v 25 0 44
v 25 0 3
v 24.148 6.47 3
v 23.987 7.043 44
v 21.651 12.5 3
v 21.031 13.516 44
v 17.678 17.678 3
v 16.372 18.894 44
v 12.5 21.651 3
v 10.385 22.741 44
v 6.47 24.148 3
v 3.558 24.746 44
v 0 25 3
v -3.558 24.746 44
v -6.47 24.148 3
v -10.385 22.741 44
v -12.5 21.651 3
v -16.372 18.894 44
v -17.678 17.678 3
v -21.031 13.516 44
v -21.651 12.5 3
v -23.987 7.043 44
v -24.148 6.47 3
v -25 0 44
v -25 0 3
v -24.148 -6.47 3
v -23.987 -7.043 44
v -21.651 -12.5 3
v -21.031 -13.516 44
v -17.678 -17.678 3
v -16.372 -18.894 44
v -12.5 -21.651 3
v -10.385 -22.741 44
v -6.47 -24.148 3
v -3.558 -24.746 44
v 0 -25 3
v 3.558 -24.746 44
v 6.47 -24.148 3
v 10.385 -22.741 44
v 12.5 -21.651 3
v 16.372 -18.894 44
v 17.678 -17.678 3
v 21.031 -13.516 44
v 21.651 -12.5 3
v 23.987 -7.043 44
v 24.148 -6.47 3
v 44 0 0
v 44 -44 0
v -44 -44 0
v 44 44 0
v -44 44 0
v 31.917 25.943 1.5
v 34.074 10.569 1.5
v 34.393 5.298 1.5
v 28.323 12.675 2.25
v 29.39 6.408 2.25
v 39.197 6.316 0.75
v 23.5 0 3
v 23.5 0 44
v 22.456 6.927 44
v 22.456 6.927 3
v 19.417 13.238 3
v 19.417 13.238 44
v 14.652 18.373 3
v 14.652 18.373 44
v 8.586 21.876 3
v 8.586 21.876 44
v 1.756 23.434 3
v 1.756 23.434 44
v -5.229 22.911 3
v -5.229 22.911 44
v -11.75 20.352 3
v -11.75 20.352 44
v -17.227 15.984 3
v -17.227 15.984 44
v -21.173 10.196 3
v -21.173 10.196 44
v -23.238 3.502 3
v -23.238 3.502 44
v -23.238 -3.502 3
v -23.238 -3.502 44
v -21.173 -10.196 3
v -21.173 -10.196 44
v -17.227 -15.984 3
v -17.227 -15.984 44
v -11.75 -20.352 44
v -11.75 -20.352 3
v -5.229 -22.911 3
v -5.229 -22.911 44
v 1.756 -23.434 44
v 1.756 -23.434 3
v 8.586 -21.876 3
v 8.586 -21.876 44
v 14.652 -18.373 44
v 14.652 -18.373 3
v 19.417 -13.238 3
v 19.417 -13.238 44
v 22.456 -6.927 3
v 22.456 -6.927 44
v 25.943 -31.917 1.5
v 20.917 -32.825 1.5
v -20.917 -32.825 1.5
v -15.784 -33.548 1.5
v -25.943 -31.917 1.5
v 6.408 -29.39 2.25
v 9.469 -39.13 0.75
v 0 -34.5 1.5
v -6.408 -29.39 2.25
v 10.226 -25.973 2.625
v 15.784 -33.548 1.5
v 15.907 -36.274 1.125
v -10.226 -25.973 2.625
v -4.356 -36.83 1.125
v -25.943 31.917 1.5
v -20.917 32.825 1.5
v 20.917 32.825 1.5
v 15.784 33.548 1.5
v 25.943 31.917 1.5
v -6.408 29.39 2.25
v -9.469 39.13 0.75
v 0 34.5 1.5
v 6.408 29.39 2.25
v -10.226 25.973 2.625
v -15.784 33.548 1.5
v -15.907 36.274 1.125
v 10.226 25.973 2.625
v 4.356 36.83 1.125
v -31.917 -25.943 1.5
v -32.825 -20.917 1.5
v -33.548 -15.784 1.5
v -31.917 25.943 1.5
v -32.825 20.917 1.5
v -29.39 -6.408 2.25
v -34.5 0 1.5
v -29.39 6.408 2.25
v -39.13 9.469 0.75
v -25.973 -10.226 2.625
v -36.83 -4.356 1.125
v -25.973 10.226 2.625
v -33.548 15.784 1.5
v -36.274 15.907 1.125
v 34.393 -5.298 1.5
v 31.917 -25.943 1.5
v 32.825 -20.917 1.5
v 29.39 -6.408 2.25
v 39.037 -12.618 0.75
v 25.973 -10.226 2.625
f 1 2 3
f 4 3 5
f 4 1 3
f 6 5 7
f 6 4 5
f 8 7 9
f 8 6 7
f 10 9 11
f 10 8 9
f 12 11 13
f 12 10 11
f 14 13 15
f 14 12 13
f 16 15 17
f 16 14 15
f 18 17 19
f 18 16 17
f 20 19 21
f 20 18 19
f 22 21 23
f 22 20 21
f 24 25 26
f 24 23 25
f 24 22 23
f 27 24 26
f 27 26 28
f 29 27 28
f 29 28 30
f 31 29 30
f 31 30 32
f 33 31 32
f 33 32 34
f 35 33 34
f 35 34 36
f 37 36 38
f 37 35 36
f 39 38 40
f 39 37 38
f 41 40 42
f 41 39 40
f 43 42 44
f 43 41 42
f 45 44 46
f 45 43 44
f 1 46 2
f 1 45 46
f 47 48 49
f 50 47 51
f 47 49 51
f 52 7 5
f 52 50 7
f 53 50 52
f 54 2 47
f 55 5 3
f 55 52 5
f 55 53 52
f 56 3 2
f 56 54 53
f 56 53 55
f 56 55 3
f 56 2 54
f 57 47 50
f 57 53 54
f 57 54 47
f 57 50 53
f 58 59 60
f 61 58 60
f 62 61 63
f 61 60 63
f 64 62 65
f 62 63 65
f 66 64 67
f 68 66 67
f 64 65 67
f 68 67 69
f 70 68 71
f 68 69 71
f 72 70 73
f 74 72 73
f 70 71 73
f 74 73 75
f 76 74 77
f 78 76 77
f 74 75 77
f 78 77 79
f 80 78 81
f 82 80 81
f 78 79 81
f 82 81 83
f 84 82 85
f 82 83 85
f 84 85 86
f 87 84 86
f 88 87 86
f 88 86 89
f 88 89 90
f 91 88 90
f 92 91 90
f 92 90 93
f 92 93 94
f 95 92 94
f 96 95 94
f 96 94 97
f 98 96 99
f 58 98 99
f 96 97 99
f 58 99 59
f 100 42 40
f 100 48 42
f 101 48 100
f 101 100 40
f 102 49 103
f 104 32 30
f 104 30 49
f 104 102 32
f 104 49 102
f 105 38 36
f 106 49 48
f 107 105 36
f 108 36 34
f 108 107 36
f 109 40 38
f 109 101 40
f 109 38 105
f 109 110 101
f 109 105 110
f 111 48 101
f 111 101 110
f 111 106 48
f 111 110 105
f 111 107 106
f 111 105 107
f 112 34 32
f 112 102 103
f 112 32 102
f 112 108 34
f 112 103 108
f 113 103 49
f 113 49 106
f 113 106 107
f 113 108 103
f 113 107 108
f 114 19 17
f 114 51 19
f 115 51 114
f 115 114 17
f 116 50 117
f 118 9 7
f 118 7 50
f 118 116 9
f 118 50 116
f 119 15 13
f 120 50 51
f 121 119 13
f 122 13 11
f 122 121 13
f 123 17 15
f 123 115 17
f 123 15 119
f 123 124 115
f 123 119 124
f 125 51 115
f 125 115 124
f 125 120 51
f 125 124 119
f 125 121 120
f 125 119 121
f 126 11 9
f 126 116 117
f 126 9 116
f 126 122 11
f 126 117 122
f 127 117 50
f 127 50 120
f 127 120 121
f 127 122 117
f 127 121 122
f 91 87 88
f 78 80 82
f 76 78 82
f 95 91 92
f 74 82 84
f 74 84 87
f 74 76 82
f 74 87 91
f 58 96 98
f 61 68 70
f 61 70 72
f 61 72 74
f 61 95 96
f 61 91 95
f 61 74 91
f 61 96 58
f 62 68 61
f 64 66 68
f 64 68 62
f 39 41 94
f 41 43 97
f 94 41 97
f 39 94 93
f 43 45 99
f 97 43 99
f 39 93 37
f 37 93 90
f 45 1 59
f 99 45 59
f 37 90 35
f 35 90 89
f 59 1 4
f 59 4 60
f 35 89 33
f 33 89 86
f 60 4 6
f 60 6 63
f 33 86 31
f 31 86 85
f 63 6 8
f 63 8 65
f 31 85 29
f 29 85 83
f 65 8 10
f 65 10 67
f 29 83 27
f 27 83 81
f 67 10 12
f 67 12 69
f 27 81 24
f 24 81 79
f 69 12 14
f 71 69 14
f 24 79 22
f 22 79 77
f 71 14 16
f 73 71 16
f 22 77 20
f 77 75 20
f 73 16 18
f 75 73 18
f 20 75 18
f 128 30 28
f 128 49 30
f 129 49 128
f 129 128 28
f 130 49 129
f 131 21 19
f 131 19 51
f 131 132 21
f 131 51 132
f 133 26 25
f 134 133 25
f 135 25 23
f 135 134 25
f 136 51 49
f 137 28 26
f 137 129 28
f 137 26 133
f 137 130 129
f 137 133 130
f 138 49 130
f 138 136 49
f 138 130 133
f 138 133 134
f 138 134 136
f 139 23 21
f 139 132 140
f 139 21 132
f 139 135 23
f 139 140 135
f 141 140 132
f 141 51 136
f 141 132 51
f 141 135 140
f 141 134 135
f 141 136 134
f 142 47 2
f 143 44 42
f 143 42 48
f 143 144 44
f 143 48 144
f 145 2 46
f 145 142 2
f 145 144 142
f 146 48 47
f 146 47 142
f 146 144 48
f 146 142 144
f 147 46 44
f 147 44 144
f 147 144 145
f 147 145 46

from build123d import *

# Parameters (mm, degrees)
F0_R     = 44
F1_DEPTH = 3
F3_W     = 25
F3_H     = 41
F6_R     = 25
F5_W     = 88
F5_H     = 88
F8_R     = 23.5
F9_DEPTH = 41


with BuildPart() as f1:
    # F0 (on Top) → F1 (new body)
    with BuildSketch(Plane.XY):
        Circle(F0_R)
    extrude(amount=F1_DEPTH)


with BuildPart() as f4:
    # F3 (on Front) → F4 (revolve)
    with BuildSketch(Plane.XZ):
        with Locations((12.5, 23.5)):
            Rectangle(F3_W, F3_H)
    revolve(axis=Axis((0, 0, 22), (0, 0, 1)))

    # F6 (on face) → F7 section 0
    with BuildSketch(Plane(origin=(0, 0, 3), x_dir=(1, 0, 0), z_dir=(0, 0, -1))):
        Circle(F6_R)
    # F5 (on Top) → F7 section 1
    with BuildSketch(Plane.XY):
        Rectangle(F5_W, F5_H)
    loft()

    # F8 (on face) → F9 (cut)
    with BuildSketch(Plane.XY.offset(44)):
        Circle(F8_R)
    extrude(amount=-F9_DEPTH, mode=Mode.SUBTRACT)


solid = f4.part
